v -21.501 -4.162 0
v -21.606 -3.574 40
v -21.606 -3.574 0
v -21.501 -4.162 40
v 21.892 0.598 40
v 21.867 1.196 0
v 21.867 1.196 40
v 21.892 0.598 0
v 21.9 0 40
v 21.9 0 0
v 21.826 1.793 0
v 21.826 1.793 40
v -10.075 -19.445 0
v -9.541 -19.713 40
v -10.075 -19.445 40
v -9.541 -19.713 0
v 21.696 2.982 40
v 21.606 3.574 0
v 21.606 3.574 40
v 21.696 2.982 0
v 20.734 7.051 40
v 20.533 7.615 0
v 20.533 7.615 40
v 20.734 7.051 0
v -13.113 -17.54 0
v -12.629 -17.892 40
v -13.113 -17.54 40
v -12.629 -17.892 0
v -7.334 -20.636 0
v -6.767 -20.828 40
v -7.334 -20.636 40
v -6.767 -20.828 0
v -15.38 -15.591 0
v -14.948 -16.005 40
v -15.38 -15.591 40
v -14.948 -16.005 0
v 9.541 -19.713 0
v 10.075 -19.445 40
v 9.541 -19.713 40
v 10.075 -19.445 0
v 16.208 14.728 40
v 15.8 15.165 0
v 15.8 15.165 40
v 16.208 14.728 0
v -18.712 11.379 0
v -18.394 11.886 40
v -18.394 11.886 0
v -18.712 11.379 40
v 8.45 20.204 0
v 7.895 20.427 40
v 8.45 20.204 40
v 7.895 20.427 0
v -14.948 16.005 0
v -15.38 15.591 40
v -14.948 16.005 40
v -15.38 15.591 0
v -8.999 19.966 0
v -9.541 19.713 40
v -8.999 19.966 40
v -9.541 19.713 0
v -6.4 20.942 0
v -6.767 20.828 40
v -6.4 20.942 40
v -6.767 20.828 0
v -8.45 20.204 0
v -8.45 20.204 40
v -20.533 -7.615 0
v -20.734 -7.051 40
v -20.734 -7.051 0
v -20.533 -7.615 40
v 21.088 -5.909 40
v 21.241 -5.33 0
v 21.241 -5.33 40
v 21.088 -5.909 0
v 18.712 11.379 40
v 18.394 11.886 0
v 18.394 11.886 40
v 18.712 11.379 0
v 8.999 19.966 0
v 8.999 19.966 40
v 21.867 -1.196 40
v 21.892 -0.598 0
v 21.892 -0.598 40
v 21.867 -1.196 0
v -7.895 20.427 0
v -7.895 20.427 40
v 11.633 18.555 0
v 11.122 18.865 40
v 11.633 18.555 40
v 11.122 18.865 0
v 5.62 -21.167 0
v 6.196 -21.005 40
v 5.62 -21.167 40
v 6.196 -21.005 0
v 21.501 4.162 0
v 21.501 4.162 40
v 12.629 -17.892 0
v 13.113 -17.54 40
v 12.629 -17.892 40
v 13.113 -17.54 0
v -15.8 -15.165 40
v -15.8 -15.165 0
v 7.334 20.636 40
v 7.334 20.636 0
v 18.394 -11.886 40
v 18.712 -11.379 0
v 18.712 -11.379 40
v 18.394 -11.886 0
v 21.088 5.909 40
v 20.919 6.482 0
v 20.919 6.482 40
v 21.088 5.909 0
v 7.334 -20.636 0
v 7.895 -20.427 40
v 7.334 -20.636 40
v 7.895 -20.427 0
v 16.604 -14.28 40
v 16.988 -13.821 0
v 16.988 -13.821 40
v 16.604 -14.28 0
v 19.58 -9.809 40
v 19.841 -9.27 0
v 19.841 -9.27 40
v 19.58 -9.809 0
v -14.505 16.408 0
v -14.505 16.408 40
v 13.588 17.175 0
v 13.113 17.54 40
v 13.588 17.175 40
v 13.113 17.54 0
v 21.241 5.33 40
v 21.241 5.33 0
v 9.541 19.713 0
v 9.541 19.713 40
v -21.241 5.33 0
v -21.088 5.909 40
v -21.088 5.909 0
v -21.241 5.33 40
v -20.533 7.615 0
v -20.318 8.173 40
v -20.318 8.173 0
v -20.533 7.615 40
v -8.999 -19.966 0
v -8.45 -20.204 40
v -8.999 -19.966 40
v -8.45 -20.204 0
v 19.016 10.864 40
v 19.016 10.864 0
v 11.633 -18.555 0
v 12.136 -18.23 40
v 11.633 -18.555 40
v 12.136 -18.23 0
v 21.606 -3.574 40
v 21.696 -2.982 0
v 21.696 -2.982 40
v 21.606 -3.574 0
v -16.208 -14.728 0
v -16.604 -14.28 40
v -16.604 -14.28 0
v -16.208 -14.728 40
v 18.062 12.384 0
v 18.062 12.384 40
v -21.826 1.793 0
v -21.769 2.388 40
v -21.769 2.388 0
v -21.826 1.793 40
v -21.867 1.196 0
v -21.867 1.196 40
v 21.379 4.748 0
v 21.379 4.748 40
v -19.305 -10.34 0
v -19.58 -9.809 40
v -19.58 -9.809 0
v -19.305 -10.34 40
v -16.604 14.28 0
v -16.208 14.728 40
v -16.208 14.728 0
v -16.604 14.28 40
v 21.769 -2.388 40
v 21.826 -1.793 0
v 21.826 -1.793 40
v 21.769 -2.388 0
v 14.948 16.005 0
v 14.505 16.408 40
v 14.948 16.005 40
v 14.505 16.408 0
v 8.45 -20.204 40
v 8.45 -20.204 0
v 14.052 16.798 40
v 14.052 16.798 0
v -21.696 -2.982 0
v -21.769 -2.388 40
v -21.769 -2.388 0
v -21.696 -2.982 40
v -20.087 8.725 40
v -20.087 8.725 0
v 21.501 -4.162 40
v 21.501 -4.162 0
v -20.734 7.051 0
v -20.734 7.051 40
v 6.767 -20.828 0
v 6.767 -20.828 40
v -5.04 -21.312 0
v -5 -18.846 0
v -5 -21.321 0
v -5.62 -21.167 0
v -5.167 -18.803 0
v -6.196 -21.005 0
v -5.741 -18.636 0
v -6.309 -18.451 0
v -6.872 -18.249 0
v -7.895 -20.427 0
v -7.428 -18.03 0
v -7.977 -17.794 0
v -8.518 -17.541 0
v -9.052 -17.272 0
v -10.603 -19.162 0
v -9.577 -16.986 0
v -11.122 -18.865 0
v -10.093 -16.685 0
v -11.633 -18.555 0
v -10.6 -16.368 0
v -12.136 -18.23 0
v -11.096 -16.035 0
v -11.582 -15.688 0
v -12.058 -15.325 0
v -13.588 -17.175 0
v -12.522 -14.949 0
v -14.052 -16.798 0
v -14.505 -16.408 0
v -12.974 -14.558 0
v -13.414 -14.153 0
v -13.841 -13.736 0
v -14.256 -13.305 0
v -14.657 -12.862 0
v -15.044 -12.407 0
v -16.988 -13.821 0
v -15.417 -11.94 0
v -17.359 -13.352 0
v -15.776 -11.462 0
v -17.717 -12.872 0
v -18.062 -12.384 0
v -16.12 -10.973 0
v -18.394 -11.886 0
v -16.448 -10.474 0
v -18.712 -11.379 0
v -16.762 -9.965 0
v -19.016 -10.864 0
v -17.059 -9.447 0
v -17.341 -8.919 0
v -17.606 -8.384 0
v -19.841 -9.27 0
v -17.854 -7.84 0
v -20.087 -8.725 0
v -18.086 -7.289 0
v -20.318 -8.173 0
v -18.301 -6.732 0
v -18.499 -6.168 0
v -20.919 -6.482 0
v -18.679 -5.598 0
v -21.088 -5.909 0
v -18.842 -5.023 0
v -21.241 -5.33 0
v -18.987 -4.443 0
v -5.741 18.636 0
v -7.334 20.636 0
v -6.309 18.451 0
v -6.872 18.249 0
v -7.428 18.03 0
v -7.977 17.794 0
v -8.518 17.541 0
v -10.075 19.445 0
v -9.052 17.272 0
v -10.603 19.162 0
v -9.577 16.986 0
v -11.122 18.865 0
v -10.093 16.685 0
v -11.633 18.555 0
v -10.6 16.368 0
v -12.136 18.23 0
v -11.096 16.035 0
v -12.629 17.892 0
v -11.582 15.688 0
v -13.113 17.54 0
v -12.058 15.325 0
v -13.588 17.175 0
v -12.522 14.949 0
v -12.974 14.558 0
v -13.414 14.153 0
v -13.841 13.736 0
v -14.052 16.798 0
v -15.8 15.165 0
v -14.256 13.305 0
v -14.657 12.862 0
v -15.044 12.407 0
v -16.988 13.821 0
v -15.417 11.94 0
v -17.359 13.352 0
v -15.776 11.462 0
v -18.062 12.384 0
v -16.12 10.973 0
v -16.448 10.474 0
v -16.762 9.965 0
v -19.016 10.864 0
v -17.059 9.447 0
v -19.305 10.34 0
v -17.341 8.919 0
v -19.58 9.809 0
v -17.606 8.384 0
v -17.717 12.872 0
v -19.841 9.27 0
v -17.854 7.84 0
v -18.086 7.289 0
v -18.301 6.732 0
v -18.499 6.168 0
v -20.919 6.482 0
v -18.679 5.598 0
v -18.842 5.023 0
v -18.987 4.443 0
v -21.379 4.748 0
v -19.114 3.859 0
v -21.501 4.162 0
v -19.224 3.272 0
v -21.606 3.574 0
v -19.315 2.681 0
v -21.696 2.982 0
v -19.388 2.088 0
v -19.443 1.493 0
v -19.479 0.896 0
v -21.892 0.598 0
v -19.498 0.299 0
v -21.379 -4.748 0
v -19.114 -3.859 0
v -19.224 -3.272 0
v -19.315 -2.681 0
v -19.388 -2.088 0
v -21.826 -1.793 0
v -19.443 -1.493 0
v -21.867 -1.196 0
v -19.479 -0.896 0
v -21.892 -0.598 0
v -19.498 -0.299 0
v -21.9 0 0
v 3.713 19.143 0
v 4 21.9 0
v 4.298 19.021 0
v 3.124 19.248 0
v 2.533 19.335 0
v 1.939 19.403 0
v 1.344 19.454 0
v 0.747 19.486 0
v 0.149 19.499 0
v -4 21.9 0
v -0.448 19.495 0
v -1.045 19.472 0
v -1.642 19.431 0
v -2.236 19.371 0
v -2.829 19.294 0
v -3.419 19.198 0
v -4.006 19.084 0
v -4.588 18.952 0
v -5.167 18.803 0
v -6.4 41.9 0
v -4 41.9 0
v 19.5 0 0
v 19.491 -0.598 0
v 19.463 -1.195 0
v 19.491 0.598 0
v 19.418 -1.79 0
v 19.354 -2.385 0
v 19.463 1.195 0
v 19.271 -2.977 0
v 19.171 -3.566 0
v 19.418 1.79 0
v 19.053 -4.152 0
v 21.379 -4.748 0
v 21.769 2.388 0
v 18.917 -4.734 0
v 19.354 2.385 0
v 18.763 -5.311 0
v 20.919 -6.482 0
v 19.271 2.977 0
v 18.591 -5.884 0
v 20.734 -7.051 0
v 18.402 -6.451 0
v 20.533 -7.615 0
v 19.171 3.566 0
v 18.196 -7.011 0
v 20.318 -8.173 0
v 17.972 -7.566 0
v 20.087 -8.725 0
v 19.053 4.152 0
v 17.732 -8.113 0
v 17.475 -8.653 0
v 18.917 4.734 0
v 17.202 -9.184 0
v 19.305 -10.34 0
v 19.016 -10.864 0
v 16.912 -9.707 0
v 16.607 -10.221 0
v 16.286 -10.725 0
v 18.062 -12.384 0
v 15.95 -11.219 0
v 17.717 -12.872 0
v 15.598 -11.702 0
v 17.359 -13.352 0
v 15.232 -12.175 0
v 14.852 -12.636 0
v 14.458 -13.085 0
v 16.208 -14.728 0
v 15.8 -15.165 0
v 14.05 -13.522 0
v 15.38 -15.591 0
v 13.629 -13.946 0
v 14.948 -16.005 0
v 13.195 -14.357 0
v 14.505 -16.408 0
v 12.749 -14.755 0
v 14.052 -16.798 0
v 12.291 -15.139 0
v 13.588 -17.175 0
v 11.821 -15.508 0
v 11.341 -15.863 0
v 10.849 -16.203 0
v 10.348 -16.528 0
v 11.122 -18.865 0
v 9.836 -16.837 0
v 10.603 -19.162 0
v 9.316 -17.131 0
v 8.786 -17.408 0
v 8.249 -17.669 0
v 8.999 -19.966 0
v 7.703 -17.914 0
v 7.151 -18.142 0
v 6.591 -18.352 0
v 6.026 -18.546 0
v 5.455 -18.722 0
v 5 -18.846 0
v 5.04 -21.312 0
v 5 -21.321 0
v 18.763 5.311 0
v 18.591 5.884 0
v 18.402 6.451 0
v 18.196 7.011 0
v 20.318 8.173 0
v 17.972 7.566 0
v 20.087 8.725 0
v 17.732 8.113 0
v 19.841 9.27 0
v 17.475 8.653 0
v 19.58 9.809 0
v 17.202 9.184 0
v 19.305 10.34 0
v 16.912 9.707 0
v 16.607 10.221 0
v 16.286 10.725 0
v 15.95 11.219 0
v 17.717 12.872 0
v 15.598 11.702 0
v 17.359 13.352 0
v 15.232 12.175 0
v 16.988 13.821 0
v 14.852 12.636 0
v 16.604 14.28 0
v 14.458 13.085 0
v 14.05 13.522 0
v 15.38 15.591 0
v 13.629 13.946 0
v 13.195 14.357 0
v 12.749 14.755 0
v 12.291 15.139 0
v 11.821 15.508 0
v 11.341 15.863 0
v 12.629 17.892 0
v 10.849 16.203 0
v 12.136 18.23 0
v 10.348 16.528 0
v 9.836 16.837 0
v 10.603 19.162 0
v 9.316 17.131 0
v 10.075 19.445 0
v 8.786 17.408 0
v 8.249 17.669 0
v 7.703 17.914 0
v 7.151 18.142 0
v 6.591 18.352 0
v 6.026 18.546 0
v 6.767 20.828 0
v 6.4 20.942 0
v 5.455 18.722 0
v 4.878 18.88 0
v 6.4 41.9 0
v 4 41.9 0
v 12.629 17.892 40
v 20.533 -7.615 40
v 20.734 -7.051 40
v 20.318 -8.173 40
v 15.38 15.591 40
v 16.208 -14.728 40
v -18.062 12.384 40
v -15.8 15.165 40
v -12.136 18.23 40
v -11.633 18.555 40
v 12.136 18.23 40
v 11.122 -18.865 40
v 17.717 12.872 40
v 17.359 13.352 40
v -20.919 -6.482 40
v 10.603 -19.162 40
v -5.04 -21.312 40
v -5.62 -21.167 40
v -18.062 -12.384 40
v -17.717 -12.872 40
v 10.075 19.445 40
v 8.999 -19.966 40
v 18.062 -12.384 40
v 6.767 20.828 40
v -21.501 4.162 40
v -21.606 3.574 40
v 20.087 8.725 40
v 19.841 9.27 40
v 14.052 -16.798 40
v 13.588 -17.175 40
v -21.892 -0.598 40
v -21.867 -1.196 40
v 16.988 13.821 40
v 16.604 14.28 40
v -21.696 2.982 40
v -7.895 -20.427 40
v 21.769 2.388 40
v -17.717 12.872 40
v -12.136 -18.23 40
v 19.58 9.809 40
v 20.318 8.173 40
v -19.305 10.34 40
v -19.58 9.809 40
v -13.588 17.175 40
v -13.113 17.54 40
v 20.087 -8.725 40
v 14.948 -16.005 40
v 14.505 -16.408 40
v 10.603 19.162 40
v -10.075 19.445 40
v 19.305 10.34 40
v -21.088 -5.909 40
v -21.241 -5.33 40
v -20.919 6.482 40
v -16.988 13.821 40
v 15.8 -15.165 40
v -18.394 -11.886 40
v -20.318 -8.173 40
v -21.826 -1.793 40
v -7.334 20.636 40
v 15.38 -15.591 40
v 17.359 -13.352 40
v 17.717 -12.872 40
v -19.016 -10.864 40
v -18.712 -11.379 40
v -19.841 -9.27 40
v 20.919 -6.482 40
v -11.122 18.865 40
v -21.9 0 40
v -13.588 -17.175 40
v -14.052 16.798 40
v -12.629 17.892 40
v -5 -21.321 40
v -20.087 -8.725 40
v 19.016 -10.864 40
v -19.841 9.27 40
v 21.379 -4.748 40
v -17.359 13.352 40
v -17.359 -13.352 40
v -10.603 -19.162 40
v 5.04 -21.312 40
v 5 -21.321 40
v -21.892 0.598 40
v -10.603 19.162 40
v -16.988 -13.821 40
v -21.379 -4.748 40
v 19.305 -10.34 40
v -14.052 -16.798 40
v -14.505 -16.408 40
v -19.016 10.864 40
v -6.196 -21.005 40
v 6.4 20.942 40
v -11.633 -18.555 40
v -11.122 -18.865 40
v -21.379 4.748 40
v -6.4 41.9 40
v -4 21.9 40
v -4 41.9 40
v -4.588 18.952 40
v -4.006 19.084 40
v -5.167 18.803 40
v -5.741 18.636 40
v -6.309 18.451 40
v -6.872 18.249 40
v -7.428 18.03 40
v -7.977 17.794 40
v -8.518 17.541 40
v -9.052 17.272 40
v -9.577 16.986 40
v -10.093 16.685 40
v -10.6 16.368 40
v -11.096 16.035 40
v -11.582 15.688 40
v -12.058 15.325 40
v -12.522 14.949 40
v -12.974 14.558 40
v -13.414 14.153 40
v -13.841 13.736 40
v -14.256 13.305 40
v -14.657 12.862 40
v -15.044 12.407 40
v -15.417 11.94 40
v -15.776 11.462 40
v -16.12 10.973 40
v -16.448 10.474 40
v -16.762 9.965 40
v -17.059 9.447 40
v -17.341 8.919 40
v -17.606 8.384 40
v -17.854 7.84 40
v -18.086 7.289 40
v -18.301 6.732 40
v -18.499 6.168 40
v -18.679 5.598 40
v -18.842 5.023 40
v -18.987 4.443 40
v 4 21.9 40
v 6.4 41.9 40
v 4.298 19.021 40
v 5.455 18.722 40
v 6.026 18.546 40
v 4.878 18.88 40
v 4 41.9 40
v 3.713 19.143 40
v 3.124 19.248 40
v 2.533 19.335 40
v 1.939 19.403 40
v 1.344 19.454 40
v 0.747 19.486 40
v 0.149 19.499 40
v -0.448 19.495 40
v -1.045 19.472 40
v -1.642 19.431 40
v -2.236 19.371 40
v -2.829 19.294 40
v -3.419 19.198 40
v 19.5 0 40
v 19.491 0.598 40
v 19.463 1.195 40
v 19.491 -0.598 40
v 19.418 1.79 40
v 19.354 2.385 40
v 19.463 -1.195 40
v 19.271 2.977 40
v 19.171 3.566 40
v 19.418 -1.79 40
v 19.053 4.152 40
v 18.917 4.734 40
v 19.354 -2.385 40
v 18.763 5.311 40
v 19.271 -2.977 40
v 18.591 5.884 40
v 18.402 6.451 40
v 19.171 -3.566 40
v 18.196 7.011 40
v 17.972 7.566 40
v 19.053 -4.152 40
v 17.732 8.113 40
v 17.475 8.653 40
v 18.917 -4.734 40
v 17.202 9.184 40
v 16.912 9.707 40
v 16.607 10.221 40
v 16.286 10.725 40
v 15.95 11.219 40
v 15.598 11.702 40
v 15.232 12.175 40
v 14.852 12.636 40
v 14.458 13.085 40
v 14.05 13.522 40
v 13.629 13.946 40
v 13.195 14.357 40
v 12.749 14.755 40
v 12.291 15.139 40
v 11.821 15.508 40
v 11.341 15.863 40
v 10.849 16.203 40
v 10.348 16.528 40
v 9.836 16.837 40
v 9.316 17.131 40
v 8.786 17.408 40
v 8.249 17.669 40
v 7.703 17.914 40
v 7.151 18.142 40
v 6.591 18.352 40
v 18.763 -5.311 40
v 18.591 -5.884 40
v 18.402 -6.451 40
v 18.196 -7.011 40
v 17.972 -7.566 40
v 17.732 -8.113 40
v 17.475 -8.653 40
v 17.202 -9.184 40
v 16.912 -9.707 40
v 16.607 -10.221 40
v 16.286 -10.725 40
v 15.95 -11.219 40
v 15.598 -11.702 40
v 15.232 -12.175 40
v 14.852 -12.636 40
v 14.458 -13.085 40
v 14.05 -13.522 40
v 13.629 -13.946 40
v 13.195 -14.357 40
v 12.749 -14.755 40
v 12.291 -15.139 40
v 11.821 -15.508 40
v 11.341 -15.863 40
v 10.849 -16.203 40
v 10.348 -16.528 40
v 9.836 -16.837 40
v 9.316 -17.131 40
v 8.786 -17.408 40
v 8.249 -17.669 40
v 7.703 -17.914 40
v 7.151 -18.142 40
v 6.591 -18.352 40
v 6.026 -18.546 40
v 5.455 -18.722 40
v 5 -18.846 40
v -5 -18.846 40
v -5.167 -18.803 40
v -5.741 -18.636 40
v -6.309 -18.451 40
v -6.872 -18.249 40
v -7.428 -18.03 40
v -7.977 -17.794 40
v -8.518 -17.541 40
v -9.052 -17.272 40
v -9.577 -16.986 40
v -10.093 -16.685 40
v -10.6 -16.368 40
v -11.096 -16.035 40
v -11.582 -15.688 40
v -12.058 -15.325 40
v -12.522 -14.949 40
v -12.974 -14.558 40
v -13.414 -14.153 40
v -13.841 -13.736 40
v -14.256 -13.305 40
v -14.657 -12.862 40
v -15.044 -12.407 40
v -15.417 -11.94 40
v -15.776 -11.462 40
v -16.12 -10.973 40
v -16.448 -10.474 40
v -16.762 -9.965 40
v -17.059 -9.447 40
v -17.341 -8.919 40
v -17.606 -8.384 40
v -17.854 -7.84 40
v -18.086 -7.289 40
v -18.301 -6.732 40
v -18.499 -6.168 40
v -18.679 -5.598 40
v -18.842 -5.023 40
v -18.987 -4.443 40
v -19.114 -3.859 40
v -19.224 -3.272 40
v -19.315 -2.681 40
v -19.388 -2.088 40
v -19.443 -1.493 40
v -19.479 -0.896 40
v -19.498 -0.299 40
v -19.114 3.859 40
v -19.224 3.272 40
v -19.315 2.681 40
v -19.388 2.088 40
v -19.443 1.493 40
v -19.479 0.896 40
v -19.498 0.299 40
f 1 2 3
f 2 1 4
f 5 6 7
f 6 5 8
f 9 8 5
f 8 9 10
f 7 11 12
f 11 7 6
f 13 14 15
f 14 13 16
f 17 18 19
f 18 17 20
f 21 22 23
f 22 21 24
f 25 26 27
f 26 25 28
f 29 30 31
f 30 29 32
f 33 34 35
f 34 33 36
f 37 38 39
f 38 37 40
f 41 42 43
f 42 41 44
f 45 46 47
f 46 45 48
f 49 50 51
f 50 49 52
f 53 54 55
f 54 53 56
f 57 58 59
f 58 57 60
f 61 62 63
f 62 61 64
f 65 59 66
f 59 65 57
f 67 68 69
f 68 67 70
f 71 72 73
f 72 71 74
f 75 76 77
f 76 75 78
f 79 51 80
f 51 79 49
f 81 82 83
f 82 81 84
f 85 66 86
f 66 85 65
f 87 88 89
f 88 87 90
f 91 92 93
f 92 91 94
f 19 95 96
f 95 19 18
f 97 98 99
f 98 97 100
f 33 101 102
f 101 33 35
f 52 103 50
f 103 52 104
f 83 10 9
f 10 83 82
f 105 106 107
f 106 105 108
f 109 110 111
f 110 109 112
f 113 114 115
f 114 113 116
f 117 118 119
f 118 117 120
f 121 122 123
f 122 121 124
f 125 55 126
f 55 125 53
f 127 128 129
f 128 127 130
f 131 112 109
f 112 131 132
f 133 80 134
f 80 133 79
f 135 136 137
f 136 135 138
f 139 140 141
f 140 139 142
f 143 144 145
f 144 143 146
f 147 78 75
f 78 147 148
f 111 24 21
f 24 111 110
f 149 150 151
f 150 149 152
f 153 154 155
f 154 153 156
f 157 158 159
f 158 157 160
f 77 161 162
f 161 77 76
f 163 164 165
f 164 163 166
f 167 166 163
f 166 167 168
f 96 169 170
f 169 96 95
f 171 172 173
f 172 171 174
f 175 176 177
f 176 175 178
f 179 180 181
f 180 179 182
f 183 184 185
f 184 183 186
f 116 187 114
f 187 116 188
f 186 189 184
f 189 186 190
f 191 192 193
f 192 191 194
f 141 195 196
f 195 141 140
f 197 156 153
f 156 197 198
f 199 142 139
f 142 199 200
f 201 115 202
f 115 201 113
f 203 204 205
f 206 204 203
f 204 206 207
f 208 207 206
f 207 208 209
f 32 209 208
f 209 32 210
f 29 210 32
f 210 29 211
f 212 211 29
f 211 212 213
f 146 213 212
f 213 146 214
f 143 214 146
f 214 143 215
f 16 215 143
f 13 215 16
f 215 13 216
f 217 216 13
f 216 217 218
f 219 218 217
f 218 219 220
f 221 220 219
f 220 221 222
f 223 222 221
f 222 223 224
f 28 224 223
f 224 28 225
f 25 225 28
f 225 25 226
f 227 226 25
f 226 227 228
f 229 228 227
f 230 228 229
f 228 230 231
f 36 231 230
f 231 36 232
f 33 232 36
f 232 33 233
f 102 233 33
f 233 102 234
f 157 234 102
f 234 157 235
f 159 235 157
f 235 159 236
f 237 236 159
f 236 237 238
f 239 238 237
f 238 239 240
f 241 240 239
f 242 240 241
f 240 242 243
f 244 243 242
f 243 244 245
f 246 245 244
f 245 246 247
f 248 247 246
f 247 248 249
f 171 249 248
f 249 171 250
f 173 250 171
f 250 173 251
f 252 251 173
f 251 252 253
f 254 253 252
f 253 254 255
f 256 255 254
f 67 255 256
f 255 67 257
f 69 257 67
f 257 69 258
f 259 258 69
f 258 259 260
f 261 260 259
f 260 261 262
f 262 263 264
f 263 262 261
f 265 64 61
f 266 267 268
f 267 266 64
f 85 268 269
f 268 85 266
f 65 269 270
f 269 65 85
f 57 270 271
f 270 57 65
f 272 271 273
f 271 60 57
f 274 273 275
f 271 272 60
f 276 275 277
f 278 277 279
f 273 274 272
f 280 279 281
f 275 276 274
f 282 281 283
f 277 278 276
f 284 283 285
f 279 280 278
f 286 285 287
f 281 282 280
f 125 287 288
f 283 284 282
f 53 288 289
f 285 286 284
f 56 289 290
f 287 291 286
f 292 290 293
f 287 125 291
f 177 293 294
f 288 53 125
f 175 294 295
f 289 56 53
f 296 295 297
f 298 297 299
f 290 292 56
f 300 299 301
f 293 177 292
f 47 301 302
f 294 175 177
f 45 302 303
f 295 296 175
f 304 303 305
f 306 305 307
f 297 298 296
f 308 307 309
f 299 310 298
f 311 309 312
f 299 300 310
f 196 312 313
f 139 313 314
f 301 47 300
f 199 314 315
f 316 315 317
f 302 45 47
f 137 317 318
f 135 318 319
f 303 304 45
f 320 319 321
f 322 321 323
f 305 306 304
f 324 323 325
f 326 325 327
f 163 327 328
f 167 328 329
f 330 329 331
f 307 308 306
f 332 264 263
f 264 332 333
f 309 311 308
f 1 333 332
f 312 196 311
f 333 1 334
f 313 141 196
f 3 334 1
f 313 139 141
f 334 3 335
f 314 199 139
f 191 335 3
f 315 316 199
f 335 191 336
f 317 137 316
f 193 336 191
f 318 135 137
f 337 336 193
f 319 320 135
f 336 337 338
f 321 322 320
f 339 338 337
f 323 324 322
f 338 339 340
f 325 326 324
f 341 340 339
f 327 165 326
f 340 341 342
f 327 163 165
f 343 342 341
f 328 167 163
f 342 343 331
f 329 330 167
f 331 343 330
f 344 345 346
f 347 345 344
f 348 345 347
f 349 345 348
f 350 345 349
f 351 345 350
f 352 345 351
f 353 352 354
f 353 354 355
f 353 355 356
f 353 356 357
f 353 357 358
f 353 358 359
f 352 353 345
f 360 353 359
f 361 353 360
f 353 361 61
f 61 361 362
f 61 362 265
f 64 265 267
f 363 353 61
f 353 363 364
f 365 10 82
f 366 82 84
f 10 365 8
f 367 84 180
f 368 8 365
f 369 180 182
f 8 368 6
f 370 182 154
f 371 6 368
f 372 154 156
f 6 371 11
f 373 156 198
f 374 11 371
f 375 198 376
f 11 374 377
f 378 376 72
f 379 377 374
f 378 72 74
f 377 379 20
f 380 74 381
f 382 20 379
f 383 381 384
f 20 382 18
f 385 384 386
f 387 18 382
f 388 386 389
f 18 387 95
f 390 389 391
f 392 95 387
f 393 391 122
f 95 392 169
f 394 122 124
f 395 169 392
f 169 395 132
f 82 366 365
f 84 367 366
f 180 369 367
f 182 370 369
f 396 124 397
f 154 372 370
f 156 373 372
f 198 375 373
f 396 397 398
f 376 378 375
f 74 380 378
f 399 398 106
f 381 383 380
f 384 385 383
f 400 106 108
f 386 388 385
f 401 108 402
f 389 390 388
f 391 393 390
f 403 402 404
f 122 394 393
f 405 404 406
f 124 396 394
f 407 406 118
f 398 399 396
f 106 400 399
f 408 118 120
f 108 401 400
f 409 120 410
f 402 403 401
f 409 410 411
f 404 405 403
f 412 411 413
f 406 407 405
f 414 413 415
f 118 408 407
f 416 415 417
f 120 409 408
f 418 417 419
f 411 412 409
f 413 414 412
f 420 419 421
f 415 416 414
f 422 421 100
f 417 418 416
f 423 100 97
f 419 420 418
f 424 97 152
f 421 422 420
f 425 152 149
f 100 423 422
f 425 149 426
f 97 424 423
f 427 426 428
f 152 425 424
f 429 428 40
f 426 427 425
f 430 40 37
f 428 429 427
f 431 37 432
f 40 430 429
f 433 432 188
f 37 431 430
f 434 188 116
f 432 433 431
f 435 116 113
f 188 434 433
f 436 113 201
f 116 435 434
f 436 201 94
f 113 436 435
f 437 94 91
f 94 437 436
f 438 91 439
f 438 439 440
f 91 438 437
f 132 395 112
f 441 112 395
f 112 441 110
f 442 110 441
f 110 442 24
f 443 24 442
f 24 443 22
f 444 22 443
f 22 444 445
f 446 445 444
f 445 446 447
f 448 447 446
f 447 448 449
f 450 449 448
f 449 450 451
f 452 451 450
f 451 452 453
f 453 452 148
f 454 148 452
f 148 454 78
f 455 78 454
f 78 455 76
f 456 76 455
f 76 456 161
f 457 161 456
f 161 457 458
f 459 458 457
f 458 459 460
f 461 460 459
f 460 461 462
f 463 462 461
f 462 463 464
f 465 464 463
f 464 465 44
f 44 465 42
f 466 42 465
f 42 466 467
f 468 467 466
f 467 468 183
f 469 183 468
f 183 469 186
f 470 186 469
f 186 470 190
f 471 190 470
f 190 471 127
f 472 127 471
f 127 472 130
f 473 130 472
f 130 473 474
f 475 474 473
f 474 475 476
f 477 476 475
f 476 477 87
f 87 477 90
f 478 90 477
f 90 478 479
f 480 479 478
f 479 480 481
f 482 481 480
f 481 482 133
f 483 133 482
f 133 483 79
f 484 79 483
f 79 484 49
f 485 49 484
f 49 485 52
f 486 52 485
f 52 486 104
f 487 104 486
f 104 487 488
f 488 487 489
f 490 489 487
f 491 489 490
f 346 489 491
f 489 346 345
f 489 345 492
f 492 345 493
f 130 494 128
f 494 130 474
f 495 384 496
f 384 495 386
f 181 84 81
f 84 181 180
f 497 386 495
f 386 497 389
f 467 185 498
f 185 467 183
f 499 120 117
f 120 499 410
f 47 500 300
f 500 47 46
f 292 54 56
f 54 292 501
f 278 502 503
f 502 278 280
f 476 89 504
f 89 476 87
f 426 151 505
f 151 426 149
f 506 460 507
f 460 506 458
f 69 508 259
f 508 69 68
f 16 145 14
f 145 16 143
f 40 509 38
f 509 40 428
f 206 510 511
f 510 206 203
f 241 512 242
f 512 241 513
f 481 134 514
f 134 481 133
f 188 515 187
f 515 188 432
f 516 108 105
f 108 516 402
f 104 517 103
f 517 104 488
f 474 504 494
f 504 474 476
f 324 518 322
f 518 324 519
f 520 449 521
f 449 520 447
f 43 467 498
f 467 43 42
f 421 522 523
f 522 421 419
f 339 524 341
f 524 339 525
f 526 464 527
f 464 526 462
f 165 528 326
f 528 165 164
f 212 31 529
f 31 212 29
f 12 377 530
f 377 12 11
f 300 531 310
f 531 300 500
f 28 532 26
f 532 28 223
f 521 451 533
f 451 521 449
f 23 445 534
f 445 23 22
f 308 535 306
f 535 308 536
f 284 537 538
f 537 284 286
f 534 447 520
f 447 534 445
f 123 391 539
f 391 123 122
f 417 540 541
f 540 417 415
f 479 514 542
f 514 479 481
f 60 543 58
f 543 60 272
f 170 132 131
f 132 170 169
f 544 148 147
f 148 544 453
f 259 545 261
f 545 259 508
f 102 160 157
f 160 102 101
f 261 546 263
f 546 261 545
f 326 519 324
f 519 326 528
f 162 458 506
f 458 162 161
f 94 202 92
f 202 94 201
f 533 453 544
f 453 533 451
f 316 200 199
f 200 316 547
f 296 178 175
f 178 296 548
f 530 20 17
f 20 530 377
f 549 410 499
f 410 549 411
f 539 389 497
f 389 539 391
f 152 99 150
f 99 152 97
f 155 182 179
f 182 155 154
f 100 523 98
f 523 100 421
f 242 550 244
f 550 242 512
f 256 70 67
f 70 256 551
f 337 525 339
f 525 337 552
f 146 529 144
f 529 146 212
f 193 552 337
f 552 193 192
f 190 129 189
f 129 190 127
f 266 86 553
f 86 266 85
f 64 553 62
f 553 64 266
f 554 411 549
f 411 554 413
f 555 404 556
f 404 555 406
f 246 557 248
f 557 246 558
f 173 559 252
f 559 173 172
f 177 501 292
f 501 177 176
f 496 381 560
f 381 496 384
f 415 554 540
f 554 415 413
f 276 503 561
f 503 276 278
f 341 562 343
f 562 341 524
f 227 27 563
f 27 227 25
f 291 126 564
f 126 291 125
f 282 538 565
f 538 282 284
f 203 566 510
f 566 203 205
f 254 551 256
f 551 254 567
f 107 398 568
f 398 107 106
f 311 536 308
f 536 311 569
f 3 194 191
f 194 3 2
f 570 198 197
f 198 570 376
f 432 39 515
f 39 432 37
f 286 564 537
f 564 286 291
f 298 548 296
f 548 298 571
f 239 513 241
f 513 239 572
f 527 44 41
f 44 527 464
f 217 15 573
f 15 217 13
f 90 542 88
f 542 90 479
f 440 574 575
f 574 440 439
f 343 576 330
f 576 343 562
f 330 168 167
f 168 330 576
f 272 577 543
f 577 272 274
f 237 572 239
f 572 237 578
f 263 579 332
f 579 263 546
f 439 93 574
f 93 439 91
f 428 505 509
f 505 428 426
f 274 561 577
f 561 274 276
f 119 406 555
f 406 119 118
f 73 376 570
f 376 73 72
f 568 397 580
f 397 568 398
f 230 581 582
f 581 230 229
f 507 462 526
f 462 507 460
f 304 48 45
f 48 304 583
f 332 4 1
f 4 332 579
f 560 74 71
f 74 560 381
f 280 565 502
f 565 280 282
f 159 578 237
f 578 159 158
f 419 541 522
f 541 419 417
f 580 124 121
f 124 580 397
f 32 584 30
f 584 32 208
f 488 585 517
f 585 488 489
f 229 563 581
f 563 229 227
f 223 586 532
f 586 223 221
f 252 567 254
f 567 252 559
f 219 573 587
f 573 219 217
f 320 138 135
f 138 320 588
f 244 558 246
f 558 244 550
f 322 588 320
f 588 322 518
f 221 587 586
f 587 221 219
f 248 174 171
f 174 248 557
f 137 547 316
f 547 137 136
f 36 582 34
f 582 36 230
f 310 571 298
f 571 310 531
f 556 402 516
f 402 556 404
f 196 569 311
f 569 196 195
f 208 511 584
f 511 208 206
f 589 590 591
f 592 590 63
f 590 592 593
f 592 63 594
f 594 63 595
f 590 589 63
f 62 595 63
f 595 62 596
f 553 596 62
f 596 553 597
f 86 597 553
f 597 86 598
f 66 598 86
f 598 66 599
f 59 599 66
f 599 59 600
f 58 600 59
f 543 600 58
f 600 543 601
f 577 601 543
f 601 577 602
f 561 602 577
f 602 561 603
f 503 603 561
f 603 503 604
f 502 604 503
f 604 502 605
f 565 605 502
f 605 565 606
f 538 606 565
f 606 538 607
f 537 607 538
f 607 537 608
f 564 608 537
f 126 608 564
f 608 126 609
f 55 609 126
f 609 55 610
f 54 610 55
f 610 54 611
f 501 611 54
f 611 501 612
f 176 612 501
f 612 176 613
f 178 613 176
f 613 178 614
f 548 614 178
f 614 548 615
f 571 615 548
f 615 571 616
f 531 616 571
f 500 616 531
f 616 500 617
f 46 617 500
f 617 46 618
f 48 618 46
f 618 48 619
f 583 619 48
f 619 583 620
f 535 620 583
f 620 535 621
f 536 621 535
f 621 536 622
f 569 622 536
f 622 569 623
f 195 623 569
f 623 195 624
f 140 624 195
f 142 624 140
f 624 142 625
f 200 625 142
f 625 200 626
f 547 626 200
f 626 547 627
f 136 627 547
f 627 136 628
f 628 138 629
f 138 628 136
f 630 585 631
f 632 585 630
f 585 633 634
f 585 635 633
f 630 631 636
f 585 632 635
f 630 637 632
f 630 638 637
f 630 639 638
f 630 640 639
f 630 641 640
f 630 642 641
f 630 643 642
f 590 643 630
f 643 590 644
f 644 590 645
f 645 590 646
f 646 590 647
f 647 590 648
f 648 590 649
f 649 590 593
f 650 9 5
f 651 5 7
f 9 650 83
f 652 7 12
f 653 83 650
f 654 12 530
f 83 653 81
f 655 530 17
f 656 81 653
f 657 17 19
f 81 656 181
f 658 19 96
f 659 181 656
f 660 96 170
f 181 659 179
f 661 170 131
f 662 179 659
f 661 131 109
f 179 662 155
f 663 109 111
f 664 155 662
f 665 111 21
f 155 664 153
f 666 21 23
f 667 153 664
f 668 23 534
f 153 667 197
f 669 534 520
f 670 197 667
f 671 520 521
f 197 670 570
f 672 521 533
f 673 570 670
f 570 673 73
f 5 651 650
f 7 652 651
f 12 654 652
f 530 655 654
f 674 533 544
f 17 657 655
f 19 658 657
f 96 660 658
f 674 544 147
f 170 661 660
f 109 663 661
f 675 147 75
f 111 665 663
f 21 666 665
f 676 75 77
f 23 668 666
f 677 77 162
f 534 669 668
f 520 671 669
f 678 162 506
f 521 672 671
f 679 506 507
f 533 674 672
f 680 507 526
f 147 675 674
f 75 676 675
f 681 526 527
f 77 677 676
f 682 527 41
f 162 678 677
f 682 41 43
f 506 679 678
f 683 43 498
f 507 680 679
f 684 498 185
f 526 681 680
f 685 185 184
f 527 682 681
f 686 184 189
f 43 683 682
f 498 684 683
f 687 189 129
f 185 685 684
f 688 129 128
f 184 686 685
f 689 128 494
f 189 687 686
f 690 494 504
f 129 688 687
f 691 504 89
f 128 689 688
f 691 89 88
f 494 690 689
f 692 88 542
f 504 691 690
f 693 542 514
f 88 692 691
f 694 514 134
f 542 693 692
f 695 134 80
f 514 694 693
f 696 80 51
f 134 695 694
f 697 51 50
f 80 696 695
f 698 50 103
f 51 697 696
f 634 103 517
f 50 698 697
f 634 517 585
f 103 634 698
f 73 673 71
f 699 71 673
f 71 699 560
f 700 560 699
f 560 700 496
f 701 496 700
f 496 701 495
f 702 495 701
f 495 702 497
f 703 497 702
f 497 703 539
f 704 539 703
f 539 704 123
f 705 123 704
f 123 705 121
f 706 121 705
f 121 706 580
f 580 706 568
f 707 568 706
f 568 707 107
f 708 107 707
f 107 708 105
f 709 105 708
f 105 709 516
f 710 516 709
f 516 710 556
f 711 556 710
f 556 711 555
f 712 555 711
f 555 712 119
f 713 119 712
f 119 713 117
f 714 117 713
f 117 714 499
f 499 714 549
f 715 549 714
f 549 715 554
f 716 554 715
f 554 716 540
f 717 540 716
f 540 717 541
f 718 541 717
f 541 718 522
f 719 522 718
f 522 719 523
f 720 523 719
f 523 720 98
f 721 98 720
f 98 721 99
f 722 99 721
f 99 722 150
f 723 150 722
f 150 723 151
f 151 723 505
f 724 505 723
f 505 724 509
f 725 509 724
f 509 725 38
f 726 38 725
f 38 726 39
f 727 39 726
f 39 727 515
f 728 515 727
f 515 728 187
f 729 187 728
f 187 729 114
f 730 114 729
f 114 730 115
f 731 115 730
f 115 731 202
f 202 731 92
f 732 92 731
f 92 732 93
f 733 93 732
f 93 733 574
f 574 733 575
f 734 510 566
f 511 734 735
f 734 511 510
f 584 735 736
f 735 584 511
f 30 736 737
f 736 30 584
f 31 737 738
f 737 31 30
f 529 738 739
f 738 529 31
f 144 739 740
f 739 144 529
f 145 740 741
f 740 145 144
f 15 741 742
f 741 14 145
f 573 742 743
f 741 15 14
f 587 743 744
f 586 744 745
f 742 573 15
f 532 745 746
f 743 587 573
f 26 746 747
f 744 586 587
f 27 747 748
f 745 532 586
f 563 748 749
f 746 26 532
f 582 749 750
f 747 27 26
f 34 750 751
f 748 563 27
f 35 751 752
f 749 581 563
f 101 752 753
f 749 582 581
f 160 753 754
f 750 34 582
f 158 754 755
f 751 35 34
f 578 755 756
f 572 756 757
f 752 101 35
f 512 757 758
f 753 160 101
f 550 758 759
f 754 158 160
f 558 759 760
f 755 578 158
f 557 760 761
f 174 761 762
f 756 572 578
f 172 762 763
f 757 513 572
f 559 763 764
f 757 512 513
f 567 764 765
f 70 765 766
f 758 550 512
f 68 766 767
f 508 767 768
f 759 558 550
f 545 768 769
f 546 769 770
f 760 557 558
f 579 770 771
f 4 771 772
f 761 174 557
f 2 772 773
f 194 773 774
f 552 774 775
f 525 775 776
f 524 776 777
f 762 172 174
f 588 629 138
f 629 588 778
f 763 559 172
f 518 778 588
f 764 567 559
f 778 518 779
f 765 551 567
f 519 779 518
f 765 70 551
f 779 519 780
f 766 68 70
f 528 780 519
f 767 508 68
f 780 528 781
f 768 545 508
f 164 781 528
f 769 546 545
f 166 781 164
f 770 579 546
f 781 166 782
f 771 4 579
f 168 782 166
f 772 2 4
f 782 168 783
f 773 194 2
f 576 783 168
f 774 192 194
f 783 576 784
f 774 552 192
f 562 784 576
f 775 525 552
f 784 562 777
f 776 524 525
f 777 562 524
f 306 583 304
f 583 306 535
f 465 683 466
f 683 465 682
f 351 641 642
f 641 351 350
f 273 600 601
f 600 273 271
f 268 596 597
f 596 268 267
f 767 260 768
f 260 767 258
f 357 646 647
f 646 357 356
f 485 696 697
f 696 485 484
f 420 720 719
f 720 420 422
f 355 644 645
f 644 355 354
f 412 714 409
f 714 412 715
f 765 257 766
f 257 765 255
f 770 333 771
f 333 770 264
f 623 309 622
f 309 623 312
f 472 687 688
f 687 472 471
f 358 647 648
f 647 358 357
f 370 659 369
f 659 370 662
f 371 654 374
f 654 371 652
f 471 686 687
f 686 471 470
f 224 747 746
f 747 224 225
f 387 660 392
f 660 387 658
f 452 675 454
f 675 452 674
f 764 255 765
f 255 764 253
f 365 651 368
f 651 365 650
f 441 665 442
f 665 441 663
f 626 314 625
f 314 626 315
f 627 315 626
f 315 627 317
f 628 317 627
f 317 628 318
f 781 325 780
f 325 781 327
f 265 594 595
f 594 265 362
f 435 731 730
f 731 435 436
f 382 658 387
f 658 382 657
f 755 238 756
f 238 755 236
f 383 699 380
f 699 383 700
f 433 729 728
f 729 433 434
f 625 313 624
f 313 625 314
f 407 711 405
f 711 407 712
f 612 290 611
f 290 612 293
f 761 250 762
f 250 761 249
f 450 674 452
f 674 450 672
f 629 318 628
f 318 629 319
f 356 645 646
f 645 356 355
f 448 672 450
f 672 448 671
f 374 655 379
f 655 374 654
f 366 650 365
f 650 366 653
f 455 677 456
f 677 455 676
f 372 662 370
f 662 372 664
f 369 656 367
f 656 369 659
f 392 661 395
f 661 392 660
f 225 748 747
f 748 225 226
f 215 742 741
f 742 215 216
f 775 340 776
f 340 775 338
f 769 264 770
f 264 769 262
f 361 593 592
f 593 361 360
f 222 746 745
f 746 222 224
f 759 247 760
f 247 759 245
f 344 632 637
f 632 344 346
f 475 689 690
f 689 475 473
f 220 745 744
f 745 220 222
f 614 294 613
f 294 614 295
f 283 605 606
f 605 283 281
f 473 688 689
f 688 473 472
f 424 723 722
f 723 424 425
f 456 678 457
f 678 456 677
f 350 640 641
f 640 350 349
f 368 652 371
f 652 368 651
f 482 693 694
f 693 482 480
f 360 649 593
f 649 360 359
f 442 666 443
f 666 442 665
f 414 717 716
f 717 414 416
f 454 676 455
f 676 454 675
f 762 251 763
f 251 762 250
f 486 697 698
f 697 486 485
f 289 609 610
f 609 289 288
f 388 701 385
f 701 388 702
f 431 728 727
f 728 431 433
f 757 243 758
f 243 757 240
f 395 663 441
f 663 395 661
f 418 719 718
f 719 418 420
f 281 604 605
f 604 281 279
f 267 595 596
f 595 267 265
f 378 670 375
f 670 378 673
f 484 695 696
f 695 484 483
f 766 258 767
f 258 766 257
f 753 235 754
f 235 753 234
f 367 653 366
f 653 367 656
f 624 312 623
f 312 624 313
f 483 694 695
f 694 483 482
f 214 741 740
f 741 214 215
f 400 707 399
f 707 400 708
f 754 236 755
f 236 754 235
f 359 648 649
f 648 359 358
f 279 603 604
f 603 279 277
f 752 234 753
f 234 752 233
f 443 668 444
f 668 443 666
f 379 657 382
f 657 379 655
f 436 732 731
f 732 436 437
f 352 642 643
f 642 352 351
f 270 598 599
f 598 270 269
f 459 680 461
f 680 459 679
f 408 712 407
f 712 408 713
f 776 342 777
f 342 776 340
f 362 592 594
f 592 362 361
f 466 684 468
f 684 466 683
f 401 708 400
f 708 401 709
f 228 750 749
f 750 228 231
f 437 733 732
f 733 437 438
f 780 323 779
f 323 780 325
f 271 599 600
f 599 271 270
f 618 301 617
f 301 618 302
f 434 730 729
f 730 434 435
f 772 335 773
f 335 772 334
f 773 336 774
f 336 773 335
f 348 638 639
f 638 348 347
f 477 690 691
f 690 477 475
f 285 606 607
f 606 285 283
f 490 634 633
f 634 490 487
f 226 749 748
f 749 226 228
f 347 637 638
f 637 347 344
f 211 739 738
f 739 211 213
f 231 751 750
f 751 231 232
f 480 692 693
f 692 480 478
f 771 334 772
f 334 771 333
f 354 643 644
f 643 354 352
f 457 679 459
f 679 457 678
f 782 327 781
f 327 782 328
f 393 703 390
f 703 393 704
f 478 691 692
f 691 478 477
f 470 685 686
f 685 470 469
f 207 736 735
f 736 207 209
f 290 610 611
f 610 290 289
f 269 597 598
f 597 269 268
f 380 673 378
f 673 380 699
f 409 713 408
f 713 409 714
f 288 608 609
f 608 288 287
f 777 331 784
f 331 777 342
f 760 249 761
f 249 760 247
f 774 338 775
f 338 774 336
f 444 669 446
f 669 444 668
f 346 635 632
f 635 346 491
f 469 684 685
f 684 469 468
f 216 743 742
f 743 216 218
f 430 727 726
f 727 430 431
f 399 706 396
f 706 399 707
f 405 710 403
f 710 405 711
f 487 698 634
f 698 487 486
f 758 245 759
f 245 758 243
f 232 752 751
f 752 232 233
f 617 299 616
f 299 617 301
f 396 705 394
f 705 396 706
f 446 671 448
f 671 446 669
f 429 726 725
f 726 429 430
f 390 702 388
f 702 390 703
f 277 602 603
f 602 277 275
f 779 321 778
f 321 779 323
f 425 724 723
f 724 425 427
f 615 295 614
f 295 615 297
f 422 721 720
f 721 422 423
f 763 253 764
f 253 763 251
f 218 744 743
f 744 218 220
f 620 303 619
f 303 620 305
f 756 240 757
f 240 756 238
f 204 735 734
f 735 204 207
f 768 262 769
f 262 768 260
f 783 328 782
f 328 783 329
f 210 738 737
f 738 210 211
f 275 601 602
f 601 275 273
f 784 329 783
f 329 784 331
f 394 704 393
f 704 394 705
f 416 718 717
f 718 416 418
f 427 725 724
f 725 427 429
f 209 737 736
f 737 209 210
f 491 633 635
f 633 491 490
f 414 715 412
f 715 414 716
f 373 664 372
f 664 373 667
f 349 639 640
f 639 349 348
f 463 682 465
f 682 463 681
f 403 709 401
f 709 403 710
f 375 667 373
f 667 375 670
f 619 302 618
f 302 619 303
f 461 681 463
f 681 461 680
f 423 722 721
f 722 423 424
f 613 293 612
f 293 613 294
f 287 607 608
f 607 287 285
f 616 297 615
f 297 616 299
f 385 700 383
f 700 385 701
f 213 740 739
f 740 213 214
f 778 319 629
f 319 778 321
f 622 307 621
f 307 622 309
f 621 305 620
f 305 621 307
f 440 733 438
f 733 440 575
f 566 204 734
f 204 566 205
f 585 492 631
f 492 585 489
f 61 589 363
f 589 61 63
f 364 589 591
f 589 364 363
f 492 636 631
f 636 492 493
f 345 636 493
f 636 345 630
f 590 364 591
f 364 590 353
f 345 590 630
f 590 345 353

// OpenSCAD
h=40;
id=39;
cutout_w=10;
tablet_d=8;
tablet_h=20;
wall=2.4;

$fa=1;
$fs=0.6;

union() {
    difference() {
        cylinder(d=id+wall*2, h=h);
        cylinder(d=id, h=h);
        translate([-cutout_w/2, -id/2-wall, 0]) cube([cutout_w, id/2, h]);
    }
    translate([-tablet_d/2-wall, id/2, 0]) difference() {
        cube([tablet_d+wall*2, tablet_h+wall, h]);
        translate([wall, wall, 0]) cube([tablet_d, tablet_h, h]);
    }
}

        
        
